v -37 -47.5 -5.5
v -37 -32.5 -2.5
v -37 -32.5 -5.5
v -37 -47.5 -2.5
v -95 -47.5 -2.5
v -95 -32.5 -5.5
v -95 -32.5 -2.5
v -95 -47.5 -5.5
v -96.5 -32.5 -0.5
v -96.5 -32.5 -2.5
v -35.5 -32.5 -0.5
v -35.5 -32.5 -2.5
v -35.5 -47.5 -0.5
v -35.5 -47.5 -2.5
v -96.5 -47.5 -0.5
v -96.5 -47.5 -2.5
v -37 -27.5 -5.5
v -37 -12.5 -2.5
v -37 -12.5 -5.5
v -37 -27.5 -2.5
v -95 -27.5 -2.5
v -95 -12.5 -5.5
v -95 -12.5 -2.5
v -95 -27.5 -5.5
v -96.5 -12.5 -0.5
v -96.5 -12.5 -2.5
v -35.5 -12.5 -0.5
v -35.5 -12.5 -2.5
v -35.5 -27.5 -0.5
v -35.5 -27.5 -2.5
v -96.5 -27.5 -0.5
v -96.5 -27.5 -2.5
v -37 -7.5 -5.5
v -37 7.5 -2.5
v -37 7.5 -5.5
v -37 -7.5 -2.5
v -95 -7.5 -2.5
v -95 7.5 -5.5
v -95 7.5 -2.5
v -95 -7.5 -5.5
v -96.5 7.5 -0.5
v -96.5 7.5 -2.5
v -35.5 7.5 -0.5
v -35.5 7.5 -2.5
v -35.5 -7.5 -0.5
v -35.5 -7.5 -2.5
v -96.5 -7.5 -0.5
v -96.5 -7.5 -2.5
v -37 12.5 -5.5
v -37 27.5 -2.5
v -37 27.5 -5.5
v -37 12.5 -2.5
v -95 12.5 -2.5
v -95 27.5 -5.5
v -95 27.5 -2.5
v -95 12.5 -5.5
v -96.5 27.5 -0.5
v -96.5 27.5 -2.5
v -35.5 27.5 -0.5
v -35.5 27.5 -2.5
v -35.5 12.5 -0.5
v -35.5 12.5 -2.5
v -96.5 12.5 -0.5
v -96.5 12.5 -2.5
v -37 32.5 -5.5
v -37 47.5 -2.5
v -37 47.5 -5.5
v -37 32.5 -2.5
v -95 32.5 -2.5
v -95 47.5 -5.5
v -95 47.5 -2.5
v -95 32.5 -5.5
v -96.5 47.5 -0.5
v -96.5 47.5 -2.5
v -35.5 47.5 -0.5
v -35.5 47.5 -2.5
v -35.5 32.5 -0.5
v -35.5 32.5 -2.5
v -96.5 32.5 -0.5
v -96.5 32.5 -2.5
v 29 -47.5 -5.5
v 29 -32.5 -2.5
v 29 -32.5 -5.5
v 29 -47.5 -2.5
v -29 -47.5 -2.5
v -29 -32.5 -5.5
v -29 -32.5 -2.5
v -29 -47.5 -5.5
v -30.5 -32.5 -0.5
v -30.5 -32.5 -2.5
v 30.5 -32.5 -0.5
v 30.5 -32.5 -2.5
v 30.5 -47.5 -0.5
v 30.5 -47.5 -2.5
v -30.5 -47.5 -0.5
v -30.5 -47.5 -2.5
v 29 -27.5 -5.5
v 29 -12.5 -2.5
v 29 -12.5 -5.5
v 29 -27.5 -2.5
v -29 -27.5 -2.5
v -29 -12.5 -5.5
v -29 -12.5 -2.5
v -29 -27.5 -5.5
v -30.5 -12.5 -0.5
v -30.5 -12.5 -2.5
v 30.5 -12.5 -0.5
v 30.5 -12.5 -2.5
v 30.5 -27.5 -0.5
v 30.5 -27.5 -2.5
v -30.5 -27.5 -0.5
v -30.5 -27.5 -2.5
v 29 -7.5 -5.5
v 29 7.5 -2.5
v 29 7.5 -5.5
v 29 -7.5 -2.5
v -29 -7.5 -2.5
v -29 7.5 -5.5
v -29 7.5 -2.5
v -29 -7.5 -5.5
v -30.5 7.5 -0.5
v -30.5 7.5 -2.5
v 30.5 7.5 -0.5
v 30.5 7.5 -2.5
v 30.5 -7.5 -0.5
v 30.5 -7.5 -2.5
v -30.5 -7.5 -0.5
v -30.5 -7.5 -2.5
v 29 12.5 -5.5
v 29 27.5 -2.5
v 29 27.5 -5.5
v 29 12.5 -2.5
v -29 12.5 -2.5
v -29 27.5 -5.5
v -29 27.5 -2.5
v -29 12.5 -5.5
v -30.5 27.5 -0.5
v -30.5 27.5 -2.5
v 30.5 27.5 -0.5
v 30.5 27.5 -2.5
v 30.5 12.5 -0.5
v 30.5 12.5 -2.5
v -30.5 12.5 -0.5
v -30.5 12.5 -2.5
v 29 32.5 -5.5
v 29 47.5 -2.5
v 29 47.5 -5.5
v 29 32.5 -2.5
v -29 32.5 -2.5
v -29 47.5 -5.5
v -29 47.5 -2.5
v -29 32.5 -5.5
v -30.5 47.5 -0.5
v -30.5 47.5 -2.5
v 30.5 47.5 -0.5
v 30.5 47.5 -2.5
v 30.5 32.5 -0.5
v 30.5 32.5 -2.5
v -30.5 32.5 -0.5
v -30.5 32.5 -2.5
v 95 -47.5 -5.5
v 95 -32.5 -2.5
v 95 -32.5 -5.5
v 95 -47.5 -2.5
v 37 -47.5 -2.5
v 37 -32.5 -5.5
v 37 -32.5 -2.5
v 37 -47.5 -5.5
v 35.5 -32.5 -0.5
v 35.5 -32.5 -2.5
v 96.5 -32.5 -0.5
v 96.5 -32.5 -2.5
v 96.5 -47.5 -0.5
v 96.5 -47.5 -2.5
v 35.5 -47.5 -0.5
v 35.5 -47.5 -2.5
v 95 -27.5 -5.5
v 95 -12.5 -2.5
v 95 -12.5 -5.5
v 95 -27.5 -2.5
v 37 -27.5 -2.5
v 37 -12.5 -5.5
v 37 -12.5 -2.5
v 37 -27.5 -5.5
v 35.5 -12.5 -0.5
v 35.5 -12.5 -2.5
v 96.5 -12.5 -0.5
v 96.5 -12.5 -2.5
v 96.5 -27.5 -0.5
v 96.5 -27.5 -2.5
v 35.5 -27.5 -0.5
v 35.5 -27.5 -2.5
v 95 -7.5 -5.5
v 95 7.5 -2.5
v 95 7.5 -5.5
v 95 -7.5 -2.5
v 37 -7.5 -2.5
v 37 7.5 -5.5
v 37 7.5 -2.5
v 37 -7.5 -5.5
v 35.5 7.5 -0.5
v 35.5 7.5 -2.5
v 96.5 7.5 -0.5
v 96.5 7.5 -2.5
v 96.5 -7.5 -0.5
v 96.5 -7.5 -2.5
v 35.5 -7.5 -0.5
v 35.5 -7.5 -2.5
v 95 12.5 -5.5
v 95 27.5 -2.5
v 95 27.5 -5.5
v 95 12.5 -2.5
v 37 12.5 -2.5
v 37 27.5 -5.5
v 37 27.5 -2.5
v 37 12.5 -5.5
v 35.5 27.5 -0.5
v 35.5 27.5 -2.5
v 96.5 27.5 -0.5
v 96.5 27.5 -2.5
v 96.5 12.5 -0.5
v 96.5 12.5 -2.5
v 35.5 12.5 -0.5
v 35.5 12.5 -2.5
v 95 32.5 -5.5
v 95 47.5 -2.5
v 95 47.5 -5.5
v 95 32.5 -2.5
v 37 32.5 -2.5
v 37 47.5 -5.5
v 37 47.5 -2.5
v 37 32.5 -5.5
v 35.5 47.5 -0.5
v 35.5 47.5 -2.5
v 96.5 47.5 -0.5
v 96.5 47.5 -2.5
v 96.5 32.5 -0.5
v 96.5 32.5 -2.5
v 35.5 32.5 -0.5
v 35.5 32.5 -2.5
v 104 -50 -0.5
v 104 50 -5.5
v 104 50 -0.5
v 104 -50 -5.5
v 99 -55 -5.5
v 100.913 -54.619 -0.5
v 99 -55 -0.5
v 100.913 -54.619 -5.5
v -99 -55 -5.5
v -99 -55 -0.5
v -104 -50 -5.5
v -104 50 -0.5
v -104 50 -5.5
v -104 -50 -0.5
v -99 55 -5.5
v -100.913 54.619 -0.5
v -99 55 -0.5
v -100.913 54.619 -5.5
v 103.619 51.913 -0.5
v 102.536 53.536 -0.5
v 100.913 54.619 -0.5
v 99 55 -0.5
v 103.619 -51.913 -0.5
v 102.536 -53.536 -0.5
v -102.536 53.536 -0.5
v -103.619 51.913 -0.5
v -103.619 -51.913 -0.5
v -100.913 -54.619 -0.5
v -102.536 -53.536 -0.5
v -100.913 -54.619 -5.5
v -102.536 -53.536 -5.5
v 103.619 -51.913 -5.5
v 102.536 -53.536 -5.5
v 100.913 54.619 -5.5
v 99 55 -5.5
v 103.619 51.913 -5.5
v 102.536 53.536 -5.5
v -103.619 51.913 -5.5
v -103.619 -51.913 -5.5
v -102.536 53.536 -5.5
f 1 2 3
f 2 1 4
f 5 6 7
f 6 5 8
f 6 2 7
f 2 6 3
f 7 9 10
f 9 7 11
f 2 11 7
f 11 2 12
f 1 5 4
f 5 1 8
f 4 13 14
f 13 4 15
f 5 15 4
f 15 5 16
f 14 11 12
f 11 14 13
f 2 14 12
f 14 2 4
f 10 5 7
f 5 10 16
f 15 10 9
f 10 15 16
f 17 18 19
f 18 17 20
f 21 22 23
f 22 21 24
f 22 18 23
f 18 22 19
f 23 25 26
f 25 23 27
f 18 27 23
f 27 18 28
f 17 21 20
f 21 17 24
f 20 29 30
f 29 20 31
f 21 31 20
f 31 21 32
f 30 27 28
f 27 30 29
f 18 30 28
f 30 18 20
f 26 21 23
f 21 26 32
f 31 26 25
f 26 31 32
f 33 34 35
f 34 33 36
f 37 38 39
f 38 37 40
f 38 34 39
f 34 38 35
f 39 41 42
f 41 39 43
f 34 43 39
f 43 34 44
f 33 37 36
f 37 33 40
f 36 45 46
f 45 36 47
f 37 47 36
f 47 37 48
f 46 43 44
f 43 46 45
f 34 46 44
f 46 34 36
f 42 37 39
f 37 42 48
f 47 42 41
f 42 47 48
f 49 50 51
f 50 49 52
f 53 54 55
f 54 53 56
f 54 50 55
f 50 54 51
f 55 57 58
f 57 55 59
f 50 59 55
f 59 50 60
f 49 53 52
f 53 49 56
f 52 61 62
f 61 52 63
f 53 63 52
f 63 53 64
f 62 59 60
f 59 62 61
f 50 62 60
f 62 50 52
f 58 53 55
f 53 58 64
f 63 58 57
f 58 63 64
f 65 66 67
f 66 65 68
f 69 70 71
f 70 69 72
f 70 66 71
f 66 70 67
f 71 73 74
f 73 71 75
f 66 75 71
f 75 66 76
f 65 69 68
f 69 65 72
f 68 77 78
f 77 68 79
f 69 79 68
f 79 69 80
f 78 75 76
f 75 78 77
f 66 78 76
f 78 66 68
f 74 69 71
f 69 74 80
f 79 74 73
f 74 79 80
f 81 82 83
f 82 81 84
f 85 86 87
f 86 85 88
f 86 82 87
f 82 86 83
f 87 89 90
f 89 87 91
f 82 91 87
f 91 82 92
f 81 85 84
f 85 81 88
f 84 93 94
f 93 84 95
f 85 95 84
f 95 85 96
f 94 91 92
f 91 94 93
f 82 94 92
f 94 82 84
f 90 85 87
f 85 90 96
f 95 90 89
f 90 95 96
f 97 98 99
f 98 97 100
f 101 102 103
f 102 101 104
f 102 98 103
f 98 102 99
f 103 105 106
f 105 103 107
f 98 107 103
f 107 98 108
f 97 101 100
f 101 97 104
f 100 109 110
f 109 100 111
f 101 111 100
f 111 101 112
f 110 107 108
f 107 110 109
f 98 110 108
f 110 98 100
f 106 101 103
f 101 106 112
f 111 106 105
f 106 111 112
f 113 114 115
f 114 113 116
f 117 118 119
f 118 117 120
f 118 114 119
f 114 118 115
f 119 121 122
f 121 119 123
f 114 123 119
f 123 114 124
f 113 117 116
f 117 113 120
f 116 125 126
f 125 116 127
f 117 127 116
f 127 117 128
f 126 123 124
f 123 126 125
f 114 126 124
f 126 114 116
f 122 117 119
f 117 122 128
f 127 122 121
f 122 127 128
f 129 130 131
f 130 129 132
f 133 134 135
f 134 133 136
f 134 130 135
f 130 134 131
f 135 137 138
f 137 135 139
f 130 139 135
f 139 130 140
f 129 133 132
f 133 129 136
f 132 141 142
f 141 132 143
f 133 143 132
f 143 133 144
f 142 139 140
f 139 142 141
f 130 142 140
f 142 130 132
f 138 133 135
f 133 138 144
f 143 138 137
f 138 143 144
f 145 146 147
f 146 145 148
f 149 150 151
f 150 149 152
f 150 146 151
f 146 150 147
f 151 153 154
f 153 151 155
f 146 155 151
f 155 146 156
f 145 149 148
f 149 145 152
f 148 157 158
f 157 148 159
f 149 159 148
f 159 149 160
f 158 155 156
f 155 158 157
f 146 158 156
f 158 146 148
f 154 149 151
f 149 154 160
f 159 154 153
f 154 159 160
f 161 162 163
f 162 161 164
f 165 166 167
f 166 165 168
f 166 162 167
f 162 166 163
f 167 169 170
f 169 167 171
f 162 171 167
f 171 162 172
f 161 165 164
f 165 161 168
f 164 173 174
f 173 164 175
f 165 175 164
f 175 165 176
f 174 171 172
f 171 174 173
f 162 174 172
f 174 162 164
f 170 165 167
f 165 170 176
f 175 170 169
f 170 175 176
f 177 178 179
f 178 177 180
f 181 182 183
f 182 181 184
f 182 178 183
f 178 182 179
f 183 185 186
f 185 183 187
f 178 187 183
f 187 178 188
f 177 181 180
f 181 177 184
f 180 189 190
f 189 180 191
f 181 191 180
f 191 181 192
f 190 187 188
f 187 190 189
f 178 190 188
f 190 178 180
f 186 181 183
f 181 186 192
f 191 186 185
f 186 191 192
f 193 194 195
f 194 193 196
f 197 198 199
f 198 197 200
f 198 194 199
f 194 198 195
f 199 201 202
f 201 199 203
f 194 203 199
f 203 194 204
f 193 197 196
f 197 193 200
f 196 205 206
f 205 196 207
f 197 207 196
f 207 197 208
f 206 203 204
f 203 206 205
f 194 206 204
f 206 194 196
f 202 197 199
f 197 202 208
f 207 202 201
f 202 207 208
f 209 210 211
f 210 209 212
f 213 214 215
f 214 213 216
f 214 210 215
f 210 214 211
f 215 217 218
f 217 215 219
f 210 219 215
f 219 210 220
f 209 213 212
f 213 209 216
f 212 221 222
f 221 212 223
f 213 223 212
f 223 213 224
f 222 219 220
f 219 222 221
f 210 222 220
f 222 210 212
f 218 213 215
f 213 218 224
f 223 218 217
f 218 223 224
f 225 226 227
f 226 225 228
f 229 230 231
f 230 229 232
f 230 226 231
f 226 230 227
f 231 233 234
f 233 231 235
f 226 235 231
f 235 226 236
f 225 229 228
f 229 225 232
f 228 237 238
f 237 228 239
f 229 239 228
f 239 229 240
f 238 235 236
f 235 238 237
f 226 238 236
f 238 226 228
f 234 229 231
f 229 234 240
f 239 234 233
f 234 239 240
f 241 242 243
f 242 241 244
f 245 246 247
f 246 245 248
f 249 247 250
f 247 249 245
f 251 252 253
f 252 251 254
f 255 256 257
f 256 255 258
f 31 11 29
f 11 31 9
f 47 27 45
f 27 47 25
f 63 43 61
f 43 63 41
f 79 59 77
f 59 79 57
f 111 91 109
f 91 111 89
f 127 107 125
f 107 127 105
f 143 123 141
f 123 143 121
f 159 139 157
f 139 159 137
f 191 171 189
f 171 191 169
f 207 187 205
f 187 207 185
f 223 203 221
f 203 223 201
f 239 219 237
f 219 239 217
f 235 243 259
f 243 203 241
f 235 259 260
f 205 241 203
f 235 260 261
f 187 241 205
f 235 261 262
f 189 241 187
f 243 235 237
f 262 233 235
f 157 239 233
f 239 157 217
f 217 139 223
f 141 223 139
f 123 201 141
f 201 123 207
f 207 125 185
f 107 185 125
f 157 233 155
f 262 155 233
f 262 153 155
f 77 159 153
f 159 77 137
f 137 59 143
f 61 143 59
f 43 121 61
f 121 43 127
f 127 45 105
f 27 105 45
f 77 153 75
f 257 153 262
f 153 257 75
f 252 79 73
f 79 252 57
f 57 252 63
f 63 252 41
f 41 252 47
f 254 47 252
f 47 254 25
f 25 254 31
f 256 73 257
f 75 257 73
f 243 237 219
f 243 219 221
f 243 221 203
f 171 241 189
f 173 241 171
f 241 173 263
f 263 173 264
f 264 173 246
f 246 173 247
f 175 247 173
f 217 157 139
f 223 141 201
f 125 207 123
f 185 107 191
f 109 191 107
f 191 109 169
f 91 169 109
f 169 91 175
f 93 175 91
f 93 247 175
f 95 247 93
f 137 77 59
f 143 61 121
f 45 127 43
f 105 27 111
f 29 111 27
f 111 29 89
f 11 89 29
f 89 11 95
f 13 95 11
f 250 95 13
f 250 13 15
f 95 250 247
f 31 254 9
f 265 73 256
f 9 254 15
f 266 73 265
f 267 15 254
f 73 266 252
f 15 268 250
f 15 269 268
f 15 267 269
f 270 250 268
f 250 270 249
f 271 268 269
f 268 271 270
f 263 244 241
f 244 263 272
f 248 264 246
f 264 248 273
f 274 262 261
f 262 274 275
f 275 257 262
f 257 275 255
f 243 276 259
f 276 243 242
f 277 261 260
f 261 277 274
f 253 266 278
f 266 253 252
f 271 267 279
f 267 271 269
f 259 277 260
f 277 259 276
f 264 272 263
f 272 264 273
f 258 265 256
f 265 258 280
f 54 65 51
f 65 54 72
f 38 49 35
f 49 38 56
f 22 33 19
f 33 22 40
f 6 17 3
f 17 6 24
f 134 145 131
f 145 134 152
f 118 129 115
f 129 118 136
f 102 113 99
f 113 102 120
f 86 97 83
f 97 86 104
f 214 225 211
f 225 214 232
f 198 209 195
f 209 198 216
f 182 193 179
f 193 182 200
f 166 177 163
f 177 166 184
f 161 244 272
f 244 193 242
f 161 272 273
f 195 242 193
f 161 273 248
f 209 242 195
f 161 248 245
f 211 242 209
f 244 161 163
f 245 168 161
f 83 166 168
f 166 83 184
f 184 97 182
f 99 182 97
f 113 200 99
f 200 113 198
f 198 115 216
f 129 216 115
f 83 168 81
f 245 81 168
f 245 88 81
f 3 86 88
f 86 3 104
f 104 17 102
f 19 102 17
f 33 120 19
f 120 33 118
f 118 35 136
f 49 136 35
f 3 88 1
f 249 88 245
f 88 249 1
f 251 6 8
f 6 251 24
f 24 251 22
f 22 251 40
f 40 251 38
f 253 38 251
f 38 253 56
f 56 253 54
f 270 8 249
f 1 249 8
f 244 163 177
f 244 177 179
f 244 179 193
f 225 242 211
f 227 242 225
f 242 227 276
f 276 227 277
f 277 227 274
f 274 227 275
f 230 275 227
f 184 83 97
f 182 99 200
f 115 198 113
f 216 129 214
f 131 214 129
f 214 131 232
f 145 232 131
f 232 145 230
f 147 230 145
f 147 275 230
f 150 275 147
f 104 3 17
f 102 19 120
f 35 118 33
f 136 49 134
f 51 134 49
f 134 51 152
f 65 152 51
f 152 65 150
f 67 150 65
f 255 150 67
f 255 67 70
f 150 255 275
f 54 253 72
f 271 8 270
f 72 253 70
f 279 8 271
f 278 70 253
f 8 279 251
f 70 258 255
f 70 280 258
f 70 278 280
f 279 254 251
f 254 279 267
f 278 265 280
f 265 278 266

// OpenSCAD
// Soldering fixture for Rocket Servo PCBA


PCB_X=61;
PCB_Y=15;
nPCB_X=3;
nPCB_Y=5;
Space_x=5;
Space_y=5;


module RoundRect(X=10,Y=10,Z=5,R=2){
	hull(){
		translate([-X/2+R, -Y/2+R, 0]) cylinder(r=R, h=Z);
		translate([-X/2+R, Y/2-R, 0]) cylinder(r=R, h=Z);
		translate([X/2-R, -Y/2+R, 0]) cylinder(r=R, h=Z);
		translate([X/2-R, Y/2-R, 0]) cylinder(r=R, h=Z);
	} // hull
} // RoundRect

module Fixture(){
	X_Size=(PCB_X+Space_x)*nPCB_X+10;
	Y_Size=(PCB_Y+Space_y)*nPCB_Y+10;
	
	difference(){
		translate([0,0,-5.5]) RoundRect(X=X_Size,Y=Y_Size,Z=5,R=5);
		
		translate([-X_Size/2+(PCB_X+Space_x)/2+5,-Y_Size/2+(PCB_Y+Space_y)/2+5,0])
		for (x=[0:nPCB_X-1])
			for (y=[0:nPCB_Y-1])
				translate([(PCB_X+Space_x)*x,(PCB_Y+Space_y)*y,0]){
					cube([PCB_X-3,PCB_Y,20],center=true);
					cube([PCB_X,PCB_Y,5],center=true);
				}
	} // difference

} // Fixture

Fixture();
